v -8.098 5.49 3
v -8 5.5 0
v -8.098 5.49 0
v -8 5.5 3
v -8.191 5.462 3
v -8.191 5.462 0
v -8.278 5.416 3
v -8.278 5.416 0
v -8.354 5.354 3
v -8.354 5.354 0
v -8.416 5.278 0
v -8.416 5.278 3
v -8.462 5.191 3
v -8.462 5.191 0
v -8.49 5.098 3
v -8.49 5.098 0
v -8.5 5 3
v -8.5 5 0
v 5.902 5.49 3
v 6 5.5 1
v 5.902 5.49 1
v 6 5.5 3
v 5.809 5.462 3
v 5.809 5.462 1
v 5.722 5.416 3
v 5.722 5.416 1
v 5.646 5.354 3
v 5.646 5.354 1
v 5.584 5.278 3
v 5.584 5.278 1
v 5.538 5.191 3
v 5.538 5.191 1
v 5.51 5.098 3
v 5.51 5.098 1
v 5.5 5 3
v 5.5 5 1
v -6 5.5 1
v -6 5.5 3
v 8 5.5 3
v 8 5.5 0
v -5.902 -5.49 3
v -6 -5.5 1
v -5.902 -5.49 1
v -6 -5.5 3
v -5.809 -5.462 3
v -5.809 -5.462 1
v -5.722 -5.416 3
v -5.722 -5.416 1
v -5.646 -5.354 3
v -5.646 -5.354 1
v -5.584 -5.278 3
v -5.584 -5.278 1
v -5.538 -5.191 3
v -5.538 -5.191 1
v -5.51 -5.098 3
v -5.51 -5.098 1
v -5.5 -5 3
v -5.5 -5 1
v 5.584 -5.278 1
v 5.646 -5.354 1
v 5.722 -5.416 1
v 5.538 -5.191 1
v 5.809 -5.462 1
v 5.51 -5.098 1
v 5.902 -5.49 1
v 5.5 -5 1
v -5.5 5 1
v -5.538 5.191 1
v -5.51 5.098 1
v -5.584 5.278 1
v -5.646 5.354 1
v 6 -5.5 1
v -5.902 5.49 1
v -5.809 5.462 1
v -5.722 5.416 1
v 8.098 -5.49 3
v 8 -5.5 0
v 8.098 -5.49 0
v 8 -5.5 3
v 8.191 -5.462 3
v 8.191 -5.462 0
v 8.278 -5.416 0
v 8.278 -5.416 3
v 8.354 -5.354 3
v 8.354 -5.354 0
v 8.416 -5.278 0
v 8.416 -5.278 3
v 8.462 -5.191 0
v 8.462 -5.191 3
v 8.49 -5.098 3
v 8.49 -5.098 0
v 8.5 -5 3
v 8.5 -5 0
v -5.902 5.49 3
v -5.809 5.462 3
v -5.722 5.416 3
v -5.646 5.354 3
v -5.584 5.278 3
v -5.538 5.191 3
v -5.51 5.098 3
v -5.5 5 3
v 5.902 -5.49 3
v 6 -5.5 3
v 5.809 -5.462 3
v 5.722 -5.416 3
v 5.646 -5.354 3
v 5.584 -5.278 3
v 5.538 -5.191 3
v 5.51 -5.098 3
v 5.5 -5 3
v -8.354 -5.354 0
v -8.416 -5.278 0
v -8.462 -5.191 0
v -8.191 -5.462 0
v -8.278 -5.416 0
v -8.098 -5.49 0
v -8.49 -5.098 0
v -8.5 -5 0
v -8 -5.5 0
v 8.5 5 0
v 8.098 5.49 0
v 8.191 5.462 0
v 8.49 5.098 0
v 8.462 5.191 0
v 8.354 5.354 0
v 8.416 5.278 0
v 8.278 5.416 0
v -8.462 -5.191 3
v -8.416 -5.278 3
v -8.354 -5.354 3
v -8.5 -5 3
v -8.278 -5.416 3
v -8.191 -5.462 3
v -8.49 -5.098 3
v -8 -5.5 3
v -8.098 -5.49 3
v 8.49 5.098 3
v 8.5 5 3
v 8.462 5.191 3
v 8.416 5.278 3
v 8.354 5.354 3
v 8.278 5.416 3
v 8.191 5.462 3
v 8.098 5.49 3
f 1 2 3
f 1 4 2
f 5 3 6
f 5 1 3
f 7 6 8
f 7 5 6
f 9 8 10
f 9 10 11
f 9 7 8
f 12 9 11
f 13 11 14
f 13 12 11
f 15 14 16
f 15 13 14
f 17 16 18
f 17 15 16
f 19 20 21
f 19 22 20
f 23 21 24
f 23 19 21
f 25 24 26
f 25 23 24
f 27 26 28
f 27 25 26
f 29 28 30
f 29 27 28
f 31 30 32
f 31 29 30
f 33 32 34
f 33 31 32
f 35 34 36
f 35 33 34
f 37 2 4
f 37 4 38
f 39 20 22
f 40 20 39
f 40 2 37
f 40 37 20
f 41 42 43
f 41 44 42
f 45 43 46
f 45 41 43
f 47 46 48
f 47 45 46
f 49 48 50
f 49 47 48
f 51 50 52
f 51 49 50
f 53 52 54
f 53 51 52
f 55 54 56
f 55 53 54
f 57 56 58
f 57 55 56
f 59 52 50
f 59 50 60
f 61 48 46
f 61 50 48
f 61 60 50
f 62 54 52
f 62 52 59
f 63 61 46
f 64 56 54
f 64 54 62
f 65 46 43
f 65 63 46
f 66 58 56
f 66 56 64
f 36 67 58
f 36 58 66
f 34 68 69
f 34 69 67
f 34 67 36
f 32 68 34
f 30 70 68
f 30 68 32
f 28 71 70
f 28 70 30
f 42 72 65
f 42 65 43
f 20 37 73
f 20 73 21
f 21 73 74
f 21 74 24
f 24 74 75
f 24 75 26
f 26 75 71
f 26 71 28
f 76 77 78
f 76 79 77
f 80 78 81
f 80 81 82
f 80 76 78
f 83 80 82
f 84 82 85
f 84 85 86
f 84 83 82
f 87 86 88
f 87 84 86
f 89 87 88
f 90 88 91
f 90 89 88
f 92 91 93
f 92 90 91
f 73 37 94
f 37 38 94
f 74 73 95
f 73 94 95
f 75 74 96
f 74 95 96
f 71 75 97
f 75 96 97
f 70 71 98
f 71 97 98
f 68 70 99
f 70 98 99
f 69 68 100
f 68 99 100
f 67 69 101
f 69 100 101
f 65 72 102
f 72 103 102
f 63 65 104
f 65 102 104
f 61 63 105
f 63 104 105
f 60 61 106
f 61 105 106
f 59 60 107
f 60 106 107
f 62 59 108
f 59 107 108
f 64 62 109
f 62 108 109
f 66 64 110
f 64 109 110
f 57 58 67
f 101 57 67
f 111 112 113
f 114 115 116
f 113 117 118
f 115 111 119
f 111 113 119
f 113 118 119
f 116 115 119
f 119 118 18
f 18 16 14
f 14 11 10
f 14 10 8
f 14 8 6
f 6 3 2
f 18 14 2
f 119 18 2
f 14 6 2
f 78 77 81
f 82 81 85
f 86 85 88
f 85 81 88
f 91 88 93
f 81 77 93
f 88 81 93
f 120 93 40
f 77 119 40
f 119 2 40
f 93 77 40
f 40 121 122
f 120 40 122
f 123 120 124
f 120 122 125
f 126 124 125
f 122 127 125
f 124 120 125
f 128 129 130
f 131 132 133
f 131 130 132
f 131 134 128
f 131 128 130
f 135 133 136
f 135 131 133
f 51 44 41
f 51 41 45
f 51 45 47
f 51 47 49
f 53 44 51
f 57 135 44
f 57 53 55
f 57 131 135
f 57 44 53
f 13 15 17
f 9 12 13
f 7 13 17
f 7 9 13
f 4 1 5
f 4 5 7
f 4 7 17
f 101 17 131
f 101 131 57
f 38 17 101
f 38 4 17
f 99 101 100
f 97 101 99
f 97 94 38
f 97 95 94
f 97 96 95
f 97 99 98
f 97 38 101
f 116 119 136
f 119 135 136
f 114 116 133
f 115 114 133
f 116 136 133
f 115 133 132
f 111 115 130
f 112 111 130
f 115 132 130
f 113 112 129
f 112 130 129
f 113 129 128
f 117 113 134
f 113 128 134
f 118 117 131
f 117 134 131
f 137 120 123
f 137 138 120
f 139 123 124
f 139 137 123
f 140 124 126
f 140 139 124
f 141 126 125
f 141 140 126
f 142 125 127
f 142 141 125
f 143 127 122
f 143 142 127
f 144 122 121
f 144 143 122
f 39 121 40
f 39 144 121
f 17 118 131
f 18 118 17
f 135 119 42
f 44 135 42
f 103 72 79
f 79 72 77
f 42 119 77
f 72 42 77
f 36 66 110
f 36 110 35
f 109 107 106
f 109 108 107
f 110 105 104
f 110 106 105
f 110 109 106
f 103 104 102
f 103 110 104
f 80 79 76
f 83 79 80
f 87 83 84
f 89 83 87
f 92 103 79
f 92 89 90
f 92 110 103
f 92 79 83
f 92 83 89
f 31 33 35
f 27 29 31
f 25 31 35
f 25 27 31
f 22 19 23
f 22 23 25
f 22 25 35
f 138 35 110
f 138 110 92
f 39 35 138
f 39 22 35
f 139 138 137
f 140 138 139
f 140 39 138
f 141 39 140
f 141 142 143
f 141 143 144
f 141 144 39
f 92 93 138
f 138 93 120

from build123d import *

# Parameters (mm, degrees)
F0_W     = 3
F0_H     = 11
F1_DEPTH = 3
F0_W_2   = 11
F2_DEPTH = 1
F3_R     = 0.5


with BuildPart() as f1:
    # F0 (on Top) → F1 (new body)
    with BuildSketch(Plane.XY):
        with Locations((-7, 0)):
            Rectangle(F0_W, F0_H)
        with Locations((7, 0)):
            Rectangle(F0_W, F0_H)
    extrude(amount=F1_DEPTH)

    # F0 (on Top) → F2 (join)
    with BuildSketch(Plane.XY):
        Rectangle(F0_W_2, F0_H)
    extrude(amount=F2_DEPTH)

    # F3
    f3_edges = [f1.edges().sort_by_distance(p)[0] for p in [
        (-5.5, -5.5, 2),
        (5.5, -5.5, 2),
        (8.5, -5.5, 1.5),
        (8.5, 5.5, 1.5),
        (-8.5, -5.5, 1.5),
        (-5.5, 5.5, 2),
        (-8.5, 5.5, 1.5),
        (5.5, 5.5, 2),
    ]]
    fillet(f3_edges, radius=F3_R)


solid = f1.part
